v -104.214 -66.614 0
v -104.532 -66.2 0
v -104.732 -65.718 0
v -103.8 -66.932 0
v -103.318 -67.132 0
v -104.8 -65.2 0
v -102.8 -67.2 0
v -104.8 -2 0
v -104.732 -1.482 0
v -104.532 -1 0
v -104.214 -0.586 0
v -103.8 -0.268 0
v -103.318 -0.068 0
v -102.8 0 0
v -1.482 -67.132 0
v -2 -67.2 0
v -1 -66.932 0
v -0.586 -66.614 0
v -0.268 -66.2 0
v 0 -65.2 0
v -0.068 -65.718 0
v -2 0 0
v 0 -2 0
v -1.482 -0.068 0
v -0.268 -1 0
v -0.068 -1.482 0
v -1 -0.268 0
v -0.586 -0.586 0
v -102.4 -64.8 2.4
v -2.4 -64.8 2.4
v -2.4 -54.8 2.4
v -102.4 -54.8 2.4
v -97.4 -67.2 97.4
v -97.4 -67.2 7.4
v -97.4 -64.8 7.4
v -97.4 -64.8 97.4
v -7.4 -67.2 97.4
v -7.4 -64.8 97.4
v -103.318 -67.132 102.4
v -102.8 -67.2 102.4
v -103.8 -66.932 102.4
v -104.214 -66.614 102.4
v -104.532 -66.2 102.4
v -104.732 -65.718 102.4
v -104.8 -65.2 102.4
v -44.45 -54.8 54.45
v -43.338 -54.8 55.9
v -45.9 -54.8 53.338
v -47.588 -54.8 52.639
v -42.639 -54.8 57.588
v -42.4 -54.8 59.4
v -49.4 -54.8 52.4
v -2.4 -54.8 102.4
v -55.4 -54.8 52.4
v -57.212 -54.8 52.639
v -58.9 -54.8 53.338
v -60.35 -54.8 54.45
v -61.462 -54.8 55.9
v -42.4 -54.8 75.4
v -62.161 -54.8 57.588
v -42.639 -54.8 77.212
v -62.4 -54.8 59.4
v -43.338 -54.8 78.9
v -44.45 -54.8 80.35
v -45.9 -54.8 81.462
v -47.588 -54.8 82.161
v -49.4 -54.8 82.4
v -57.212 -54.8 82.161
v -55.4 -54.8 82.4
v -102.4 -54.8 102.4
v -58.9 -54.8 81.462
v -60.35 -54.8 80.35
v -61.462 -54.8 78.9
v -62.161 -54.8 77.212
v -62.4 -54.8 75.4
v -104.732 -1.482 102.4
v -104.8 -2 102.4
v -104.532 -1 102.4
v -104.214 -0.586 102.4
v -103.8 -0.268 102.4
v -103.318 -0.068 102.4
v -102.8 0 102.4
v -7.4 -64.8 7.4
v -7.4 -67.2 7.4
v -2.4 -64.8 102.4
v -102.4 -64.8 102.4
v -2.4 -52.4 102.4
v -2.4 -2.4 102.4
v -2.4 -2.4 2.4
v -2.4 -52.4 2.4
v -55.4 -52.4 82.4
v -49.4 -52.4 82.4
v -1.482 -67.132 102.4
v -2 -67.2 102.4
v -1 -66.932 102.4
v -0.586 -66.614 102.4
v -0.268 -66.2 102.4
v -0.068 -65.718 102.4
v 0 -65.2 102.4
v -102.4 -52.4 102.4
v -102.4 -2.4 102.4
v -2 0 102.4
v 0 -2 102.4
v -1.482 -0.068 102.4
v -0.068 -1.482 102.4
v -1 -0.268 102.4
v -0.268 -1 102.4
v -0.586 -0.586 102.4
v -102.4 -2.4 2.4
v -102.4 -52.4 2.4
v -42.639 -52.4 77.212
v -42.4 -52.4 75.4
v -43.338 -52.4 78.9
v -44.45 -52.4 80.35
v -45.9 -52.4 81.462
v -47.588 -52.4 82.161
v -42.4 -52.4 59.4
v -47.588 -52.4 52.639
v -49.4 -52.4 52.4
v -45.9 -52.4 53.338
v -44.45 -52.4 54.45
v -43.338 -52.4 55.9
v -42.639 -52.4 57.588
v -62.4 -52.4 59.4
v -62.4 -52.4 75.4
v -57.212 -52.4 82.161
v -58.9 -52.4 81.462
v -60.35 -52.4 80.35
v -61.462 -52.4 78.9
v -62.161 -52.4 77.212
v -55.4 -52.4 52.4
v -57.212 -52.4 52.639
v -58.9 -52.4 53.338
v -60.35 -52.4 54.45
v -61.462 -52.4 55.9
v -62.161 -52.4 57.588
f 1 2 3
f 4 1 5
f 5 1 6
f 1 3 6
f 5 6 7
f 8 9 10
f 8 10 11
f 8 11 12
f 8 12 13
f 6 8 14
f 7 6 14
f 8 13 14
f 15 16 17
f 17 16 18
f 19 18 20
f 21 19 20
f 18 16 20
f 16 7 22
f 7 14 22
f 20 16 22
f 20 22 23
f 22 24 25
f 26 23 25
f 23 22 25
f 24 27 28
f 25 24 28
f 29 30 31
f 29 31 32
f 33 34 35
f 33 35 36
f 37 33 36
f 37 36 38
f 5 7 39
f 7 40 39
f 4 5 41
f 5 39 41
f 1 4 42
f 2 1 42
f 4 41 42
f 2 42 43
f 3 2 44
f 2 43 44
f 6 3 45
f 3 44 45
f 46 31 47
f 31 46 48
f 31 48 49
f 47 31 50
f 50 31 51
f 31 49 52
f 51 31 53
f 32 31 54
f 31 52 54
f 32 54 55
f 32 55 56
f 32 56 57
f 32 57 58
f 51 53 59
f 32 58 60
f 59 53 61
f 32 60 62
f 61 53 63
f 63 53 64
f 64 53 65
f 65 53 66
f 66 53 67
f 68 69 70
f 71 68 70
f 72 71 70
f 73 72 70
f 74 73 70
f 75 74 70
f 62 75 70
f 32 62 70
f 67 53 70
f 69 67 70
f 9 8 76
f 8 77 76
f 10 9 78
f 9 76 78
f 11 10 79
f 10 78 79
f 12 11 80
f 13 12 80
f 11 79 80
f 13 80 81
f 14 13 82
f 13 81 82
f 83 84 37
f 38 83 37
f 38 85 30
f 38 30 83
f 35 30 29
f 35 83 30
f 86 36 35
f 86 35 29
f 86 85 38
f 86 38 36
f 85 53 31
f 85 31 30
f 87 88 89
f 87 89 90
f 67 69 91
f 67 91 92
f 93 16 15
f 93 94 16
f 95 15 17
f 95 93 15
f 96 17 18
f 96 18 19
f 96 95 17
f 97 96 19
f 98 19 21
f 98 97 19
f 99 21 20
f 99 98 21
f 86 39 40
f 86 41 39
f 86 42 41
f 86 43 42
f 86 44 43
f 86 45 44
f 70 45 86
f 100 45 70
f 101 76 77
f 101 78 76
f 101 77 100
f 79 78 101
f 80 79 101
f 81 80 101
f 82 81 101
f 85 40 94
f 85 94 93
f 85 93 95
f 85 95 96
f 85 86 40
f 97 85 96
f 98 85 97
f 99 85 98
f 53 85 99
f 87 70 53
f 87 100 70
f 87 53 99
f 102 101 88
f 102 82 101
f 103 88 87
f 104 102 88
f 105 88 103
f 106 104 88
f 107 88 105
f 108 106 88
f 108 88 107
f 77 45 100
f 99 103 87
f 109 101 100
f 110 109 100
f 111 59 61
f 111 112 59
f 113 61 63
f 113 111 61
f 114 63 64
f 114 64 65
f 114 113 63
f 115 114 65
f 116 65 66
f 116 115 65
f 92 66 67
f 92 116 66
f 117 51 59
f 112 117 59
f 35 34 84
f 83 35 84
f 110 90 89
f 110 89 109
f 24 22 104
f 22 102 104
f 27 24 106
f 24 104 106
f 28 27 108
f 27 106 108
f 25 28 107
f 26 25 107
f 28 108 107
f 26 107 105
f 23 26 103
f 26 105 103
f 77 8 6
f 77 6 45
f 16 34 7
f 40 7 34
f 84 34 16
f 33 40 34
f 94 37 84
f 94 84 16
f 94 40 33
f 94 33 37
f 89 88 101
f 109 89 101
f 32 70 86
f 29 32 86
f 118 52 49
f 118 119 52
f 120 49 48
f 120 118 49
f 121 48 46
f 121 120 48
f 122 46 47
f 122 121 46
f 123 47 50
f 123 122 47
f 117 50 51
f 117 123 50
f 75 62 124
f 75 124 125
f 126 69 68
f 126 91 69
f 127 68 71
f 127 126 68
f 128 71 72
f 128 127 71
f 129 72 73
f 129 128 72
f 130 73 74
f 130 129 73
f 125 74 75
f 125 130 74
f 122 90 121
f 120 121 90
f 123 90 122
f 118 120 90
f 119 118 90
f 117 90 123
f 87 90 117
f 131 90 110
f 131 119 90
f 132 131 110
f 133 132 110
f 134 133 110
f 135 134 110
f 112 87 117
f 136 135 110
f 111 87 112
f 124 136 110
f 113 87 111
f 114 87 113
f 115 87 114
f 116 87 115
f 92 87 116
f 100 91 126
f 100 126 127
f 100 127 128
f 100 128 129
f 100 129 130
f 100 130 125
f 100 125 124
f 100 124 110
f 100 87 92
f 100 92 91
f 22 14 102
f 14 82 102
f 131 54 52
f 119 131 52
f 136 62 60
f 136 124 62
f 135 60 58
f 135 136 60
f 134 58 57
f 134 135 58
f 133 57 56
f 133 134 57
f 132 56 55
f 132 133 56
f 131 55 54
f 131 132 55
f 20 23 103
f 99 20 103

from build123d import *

# Parameters (mm, degrees)
SKETCH_W        = 104.8
SKETCH_H        = 102.4
PAD_DEPTH       = 67.2
SKETCH001_W     = 100
SKETCH001_H     = 50
POCKET_DEPTH    = 100
SKETCH002_W     = 100
SKETCH002_H     = 10
POCKET001_DEPTH = 100
SKETCH003_W     = 90
SKETCH003_H     = 90
POCKET002_DEPTH = 3
SKETCH004_W     = 20
SKETCH004_H     = 30
POCKET003_DEPTH = 5
FILLET_R        = 2
FILLET001_R     = 2
FILLET002_R     = 2
FILLET003_R     = 2
FILLET004_R     = 7
FILLET005_R     = 7
FILLET006_R     = 7
FILLET007_R     = 7


with BuildPart() as part:
    # Sketch → Pad (new body)
    with BuildSketch(Plane.XZ):
        with Locations((-52.4, 51.2)):
            Rectangle(SKETCH_W, SKETCH_H)
    extrude(amount=PAD_DEPTH)

    # Sketch001 (on Face1 of Pad) → Pocket (cut)
    with BuildSketch(Plane(origin=(0, 0, 102.4), x_dir=(-1, 0, 0), z_dir=(0, 0, 1))):
        with Locations((52.4, 27.4)):
            Rectangle(SKETCH001_W, SKETCH001_H)
    extrude(amount=-POCKET_DEPTH, mode=Mode.SUBTRACT)

    # Sketch002 (on Face1 of Pocket) → Pocket001 (cut)
    with BuildSketch(Plane(origin=(0, 0, 102.4), x_dir=(-1, 0, 0), z_dir=(0, 0, 1))):
        with Locations((52.4, 59.8)):
            Rectangle(SKETCH002_W, SKETCH002_H)
    extrude(amount=-POCKET001_DEPTH, mode=Mode.SUBTRACT)

    # Sketch003 (on Face4 of Pocket001) → Pocket002 (cut)
    with BuildSketch(Plane.XZ.offset(67.2)):
        with Locations((-52.4, 52.4)):
            Rectangle(SKETCH003_W, SKETCH003_H)
    extrude(amount=-POCKET002_DEPTH, mode=Mode.SUBTRACT)

    # Sketch004 (on Face7 of Pocket002) → Pocket003 (cut)
    with BuildSketch(Plane.XZ.offset(54.8)):
        with Locations((-52.4, 67.4)):
            Rectangle(SKETCH004_W, SKETCH004_H)
    extrude(amount=-POCKET003_DEPTH, mode=Mode.SUBTRACT)

    # Fillet
    fillet_edges = [part.edges().sort_by_distance(p)[0] for p in [
        (0, -67.2, 51.2),
    ]]
    fillet(fillet_edges, radius=FILLET_R)

    # Fillet001
    fillet001_edges = [part.edges().sort_by_distance(p)[0] for p in [
        (-104.8, -67.2, 51.2),
    ]]
    fillet(fillet001_edges, radius=FILLET001_R)

    # Fillet002
    fillet002_edges = [part.edges().sort_by_distance(p)[0] for p in [
        (-104.8, 0, 51.2),
    ]]
    fillet(fillet002_edges, radius=FILLET002_R)

    # Fillet003
    fillet003_edges = [part.edges().sort_by_distance(p)[0] for p in [
        (0, 0, 51.2),
    ]]
    fillet(fillet003_edges, radius=FILLET003_R)

    # Fillet004
    fillet004_edges = [part.edges().sort_by_distance(p)[0] for p in [
        (-62.4, -53.6, 52.4),
    ]]
    fillet(fillet004_edges, radius=FILLET004_R)

    # Fillet005
    fillet005_edges = [part.edges().sort_by_distance(p)[0] for p in [
        (-42.4, -53.6, 52.4),
    ]]
    fillet(fillet005_edges, radius=FILLET005_R)

    # Fillet006
    fillet006_edges = [part.edges().sort_by_distance(p)[0] for p in [
        (-42.4, -53.6, 82.4),
    ]]
    fillet(fillet006_edges, radius=FILLET006_R)

    # Fillet007
    fillet007_edges = [part.edges().sort_by_distance(p)[0] for p in [
        (-62.4, -53.6, 82.4),
    ]]
    fillet(fillet007_edges, radius=FILLET007_R)


solid = part.part
